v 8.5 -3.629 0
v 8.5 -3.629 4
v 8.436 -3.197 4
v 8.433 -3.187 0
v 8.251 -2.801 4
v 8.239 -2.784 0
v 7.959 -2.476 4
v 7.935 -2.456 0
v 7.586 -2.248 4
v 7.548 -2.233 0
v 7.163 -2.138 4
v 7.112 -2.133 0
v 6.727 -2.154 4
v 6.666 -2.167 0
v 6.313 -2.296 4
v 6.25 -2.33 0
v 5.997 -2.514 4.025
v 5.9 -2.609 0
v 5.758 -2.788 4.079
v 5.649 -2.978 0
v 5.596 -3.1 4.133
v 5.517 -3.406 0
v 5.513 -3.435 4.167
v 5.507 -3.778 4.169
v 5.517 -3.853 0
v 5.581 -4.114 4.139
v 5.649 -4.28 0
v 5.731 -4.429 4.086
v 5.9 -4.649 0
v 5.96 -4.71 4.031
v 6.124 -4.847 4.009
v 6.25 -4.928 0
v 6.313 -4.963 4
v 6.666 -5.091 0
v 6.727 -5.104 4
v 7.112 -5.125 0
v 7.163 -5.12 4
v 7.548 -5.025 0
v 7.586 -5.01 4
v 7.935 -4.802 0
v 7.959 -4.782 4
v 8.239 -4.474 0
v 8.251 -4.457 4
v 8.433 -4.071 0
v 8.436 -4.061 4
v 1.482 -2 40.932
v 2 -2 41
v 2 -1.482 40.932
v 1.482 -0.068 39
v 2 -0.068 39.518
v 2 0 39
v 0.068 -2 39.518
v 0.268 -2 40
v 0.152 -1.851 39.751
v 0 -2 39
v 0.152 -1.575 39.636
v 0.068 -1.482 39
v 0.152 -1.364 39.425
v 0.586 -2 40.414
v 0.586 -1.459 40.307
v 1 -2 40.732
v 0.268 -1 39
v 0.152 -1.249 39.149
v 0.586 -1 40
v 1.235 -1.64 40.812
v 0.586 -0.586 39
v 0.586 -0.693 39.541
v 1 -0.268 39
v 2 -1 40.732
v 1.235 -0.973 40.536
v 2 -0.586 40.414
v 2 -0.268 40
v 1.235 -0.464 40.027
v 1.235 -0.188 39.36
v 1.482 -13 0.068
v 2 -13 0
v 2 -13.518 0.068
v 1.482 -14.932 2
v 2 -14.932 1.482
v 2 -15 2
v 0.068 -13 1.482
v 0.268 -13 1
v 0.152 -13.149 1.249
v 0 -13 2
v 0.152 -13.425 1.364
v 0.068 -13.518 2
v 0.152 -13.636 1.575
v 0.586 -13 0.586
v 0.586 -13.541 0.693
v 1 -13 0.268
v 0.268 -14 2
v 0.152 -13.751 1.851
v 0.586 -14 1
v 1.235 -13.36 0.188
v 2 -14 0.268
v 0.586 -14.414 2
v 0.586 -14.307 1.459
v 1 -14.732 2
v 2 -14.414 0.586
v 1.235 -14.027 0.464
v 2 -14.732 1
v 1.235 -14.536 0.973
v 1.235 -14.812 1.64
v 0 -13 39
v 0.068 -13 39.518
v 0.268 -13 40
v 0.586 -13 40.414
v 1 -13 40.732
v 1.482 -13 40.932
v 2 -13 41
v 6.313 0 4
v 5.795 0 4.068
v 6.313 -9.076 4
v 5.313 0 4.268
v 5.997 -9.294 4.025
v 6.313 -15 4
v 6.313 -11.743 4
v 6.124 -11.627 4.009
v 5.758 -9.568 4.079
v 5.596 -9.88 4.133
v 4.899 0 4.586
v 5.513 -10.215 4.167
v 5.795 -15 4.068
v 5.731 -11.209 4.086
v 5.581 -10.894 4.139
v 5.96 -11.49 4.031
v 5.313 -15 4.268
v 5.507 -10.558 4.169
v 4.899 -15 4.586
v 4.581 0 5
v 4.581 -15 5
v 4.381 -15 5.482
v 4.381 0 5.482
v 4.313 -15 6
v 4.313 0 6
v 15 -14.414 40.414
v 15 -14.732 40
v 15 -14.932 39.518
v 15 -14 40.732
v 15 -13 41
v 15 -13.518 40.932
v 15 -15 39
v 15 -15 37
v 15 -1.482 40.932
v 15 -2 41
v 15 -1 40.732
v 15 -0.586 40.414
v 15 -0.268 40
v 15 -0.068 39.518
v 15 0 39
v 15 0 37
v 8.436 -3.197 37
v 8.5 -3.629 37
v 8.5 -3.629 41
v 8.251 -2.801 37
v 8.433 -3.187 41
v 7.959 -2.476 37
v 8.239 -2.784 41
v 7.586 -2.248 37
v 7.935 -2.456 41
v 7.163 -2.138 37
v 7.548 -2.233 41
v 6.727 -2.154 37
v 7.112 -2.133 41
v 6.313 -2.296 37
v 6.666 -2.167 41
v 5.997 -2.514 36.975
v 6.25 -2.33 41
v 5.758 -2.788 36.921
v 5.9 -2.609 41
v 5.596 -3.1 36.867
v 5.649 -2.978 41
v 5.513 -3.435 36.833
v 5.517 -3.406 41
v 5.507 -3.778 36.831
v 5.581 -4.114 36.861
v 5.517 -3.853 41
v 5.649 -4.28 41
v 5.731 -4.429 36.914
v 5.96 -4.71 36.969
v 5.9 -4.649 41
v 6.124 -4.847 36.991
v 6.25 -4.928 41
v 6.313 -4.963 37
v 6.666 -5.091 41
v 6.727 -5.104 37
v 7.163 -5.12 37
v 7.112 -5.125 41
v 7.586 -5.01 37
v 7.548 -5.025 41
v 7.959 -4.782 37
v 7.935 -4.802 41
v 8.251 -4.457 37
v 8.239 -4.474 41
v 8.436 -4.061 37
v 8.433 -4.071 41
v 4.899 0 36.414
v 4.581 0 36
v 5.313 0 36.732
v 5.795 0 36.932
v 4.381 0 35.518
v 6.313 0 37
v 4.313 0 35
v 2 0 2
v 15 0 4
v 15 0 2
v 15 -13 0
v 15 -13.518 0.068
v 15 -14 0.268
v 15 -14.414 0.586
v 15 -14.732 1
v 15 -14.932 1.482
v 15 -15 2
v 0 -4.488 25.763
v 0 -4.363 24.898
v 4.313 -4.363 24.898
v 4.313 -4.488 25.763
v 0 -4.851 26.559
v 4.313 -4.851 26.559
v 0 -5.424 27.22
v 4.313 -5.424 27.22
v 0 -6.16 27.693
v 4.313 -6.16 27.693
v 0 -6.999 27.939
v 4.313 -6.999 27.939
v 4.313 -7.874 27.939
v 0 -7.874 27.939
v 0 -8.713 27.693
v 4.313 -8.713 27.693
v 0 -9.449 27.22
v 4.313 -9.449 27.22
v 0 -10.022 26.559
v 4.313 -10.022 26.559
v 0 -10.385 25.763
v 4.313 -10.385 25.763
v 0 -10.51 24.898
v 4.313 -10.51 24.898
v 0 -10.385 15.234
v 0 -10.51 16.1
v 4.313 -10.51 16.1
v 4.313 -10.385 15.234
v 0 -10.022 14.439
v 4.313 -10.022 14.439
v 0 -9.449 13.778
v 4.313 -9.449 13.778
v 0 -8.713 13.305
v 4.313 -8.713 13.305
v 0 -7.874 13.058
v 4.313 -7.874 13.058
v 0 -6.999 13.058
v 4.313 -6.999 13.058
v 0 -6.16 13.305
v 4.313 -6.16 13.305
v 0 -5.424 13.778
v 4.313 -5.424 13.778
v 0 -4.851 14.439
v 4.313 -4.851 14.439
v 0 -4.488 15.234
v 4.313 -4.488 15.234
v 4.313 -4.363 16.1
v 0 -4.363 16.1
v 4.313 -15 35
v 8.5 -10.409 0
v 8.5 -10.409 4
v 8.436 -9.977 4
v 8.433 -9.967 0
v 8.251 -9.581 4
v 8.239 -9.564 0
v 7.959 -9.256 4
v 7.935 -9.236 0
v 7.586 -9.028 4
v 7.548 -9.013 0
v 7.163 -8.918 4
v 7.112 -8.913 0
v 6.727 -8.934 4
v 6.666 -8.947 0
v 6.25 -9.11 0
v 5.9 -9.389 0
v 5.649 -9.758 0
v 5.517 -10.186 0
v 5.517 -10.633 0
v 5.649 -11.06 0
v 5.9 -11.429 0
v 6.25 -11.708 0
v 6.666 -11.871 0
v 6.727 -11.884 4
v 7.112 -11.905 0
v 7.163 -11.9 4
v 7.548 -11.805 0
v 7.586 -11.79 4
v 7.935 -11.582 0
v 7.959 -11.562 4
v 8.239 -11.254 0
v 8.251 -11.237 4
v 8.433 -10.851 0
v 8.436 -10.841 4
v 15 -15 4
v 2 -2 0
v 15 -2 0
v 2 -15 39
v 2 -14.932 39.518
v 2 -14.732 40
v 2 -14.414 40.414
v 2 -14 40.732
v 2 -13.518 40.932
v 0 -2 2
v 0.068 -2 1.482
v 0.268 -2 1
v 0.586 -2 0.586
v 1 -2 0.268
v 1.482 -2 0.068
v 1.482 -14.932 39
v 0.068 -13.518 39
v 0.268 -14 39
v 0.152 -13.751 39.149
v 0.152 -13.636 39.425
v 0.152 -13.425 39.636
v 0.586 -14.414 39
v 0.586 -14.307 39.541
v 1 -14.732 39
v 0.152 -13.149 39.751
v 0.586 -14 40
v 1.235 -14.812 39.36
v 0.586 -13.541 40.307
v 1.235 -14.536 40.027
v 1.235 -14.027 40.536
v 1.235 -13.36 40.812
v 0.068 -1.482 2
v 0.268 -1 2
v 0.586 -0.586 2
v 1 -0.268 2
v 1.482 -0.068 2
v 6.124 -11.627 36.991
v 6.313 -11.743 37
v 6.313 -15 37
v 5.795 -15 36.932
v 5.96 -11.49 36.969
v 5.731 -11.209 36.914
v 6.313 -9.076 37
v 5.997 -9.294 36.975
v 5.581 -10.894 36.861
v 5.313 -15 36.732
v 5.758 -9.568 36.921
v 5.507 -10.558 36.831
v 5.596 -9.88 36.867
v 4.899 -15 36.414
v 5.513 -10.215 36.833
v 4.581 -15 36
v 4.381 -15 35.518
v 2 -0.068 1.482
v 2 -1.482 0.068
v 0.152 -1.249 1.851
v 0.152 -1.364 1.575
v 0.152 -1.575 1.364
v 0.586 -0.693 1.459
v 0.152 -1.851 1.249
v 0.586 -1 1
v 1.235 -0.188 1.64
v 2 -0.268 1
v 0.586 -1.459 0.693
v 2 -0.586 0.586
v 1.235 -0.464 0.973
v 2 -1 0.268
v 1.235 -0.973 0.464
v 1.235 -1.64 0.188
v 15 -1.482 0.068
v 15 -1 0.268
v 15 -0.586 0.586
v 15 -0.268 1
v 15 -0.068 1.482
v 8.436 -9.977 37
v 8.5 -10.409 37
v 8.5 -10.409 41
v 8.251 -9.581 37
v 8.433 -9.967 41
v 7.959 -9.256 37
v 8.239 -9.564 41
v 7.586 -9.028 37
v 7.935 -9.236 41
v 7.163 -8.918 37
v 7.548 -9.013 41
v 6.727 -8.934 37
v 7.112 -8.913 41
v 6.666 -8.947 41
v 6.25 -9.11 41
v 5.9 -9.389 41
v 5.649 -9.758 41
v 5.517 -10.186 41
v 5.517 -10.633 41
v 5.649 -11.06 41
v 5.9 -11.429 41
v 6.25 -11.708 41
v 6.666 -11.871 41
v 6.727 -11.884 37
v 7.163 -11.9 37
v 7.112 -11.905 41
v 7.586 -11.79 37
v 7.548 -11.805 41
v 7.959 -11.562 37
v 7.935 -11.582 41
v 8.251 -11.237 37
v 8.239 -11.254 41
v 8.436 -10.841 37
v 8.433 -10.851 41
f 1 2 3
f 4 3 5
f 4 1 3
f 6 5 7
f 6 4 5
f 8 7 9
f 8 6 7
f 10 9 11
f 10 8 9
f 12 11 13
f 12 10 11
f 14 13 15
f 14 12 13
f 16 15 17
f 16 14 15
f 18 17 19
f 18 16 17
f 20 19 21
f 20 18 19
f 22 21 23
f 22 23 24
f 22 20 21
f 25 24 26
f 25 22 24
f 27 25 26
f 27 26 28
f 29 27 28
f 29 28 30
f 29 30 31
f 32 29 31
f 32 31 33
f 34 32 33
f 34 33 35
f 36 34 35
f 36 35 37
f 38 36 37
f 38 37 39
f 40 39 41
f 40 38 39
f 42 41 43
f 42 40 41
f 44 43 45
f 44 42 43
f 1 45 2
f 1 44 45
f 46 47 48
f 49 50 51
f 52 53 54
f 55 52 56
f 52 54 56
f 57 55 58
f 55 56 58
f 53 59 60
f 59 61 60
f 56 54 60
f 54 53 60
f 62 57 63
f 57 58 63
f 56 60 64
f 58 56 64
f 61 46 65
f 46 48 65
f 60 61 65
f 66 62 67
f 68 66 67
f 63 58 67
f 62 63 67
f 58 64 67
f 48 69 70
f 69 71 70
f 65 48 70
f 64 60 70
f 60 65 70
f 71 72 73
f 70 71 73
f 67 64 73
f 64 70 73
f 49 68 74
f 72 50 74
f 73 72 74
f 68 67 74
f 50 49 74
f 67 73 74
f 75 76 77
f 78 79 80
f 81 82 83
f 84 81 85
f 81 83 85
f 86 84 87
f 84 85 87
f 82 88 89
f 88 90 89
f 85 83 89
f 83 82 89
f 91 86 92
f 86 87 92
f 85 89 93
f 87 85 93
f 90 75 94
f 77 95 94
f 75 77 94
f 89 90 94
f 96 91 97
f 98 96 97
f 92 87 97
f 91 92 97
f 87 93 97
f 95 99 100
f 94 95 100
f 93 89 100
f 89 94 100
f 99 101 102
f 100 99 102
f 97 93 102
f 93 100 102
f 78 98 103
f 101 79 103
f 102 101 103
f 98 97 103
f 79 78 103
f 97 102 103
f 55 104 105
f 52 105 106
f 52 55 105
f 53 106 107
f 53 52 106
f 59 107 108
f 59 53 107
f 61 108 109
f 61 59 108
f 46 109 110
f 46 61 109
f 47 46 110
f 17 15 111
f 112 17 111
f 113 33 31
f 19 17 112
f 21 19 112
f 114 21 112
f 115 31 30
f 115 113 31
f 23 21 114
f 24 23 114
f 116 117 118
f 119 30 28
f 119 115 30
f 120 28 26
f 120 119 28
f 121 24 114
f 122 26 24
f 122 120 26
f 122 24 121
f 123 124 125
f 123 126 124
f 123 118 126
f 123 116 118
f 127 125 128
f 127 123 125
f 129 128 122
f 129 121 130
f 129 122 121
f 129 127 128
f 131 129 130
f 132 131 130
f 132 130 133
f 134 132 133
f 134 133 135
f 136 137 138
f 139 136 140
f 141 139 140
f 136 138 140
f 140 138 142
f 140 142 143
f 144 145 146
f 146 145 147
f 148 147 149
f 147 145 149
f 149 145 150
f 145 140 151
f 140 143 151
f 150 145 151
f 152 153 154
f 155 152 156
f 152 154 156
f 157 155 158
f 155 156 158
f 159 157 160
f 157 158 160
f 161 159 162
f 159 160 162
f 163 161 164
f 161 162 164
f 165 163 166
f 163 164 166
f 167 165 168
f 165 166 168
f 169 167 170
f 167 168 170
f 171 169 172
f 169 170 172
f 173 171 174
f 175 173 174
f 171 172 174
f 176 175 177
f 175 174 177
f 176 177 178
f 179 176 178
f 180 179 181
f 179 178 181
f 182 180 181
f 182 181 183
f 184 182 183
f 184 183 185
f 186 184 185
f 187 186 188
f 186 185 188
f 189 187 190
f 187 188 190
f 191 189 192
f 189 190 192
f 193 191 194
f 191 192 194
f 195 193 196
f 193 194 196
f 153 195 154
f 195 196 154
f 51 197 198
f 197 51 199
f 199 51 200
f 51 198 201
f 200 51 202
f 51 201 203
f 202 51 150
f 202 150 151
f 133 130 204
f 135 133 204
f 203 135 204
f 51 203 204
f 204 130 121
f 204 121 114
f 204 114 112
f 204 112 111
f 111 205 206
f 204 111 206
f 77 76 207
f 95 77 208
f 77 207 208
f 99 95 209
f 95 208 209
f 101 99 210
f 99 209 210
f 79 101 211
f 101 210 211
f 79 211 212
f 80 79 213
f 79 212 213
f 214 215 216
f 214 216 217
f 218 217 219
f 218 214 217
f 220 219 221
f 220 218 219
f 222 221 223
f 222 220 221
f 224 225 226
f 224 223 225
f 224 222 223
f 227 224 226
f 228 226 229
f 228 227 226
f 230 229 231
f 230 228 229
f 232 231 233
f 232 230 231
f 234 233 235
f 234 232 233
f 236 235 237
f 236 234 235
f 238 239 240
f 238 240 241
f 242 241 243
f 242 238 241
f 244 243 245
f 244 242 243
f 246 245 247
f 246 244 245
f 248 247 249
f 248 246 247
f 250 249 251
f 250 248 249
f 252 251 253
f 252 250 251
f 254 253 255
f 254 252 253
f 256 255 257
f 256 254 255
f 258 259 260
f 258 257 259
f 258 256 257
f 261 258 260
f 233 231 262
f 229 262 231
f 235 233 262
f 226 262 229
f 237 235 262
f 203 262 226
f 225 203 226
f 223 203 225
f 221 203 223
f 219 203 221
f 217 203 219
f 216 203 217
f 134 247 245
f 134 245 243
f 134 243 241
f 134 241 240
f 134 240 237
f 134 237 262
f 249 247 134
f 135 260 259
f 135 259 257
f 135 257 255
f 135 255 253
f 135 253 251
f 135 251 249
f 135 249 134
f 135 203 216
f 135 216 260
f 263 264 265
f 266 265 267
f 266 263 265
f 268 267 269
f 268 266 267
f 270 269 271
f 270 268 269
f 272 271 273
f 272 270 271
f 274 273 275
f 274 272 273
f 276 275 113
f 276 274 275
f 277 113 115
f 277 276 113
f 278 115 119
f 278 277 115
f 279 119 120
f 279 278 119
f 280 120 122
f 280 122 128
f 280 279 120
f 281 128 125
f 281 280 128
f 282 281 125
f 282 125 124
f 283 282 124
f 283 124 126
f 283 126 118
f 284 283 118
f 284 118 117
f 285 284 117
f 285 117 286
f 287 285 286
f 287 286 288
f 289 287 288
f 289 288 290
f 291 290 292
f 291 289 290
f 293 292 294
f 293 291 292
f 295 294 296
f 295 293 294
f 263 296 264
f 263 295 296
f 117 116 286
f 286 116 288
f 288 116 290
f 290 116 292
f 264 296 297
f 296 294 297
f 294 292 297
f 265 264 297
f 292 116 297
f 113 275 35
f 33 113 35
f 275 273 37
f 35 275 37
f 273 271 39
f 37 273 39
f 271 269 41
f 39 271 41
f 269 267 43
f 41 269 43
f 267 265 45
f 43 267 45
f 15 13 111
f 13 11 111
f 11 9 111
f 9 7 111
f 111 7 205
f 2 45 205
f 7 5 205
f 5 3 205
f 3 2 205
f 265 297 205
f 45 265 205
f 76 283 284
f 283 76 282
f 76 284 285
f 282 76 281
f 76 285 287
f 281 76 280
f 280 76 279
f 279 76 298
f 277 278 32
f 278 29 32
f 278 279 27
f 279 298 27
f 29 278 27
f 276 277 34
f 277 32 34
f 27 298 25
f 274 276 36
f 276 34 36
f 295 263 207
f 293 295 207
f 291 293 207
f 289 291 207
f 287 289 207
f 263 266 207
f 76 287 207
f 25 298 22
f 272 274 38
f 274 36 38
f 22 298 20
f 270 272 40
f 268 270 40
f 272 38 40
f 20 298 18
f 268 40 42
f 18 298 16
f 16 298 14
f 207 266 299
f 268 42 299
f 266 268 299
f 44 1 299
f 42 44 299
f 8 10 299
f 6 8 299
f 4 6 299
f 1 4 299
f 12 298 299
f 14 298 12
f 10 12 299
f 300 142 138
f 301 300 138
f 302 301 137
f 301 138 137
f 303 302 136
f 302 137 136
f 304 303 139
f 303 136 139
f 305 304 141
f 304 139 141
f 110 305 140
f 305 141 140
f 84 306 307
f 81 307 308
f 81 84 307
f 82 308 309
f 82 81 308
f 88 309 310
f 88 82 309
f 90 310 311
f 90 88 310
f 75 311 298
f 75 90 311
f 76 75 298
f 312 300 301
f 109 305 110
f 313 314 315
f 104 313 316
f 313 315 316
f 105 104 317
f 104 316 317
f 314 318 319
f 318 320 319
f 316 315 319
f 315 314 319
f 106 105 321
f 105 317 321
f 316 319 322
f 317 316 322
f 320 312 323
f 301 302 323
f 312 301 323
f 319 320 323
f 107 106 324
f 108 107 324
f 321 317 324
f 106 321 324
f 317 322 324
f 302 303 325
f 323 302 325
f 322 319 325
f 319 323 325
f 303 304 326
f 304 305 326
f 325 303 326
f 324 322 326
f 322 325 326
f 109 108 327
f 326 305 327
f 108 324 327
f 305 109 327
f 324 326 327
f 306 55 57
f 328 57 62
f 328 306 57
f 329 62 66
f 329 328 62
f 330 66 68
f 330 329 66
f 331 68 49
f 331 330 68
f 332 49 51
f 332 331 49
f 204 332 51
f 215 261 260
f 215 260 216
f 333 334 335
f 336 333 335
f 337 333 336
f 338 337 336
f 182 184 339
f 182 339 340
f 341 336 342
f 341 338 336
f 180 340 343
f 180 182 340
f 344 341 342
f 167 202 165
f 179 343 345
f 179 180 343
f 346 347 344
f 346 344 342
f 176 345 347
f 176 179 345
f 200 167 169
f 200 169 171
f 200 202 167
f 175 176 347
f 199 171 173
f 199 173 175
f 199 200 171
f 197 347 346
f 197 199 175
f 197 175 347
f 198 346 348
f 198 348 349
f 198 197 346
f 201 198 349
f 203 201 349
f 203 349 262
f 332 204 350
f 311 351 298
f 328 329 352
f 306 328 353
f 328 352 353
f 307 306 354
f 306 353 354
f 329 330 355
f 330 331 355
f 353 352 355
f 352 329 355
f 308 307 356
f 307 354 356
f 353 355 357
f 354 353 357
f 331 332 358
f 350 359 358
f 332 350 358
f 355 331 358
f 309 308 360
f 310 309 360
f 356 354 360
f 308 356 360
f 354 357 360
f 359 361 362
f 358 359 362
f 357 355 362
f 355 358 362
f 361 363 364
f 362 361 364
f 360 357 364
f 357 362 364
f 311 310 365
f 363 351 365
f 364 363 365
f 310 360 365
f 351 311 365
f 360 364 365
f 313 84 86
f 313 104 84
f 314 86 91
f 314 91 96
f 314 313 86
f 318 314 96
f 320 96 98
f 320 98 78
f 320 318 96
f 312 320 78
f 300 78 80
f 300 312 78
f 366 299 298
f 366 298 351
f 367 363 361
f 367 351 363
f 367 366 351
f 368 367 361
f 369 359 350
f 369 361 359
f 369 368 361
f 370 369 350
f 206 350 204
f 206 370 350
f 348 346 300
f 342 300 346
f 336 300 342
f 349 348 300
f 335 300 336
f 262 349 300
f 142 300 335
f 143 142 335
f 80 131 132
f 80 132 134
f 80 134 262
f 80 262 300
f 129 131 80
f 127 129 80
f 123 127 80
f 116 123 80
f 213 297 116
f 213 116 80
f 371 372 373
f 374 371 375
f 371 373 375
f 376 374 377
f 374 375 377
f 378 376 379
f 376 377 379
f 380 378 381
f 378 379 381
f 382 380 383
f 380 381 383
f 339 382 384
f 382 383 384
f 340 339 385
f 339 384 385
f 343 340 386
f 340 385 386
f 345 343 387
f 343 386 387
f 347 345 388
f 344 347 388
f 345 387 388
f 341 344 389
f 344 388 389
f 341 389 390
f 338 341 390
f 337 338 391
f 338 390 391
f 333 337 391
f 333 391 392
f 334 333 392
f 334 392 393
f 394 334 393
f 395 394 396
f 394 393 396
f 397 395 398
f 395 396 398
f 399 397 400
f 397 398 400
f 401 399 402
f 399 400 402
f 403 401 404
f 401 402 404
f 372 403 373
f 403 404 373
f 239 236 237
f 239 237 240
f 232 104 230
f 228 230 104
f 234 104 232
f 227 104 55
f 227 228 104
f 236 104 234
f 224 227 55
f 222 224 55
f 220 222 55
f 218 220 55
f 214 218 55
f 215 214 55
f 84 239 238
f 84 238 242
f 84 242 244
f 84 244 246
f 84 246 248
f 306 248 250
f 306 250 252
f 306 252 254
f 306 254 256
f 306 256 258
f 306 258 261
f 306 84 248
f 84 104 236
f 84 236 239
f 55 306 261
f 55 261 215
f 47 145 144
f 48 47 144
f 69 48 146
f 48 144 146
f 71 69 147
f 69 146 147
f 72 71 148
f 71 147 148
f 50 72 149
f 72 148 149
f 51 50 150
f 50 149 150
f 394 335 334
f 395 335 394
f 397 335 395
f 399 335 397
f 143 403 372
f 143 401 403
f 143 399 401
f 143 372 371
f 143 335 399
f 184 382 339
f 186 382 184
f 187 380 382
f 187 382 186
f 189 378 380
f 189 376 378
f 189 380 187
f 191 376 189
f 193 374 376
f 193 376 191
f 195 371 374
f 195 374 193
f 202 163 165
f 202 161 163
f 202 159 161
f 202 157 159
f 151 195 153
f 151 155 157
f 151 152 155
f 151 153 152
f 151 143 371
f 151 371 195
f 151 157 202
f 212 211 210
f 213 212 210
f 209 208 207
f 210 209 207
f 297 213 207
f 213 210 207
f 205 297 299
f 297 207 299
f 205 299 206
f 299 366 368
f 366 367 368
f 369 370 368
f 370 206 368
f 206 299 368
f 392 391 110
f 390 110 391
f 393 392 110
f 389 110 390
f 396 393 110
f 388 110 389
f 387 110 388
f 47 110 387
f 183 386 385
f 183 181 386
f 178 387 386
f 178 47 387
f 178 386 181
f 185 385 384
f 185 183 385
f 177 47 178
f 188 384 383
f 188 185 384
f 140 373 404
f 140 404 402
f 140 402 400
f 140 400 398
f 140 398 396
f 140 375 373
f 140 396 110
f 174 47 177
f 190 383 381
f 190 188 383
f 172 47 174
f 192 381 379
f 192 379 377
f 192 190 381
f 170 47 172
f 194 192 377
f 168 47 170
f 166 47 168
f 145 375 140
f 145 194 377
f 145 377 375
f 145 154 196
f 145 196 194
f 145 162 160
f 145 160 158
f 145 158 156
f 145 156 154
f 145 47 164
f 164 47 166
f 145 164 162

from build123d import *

# Parameters (mm, degrees)
SKETCH_1_W               = 15
SKETCH_1_H               = 15
EXTRUDE_1_DEPTH          = 41
SKETCH_2_W               = 33
SKETCH_2_H               = 15
CUT_EXTRUDE_1_DEPTH      = 10.686952674
CUT_EXTRUDE_3_DEPTH      = 47.16275555
CUT_EXTRUDE_3_DEPTH_BACK = 47.16275555
SKETCH_3_R               = 1.5
CUT_EXTRUDE_4_DEPTH      = 47.16275555
FILLET_1_R               = 2
FILLET_2_R               = 2
FILLET_3_R               = 2
FILLET_4_R               = 2
FILLET_5_R               = 2
FILLET_6_R               = 2
FILLET_7_R               = 2


with BuildPart() as part:
    # 草图1 → 凸台-拉伸1 (new body)
    with BuildSketch(Plane.XY):
        with Locations((7.5, -7.5)):
            Rectangle(SKETCH_1_W, SKETCH_1_H)
    extrude(amount=EXTRUDE_1_DEPTH)

    # 草图2 → 切除-拉伸1 (cut)
    with BuildSketch(Plane(origin=(15, 0, 0), x_dir=(0, 0, -1), z_dir=(1, 0, 0))):
        with Locations((-20.5, -7.5)):
            Rectangle(SKETCH_2_W, SKETCH_2_H)
    extrude(amount=-CUT_EXTRUDE_1_DEPTH, mode=Mode.SUBTRACT)

    # 草图3 → 切除-拉伸3 (cut, two sides: drawn at the far end of the back side and taken through both)
    with BuildSketch(Plane.XY.offset(41).offset(-CUT_EXTRUDE_3_DEPTH_BACK)):
        with Locations((7, -3.629065036)):
            Circle(SKETCH_3_R)
        with Locations((7, -10.409065036)):
            Circle(SKETCH_3_R)
    extrude(amount=CUT_EXTRUDE_3_DEPTH + CUT_EXTRUDE_3_DEPTH_BACK, mode=Mode.SUBTRACT)

    # 草图4 → 切除-拉伸4 (cut, through all)
    with BuildSketch(Plane.ZY):
        with BuildLine():
            Line((16.1, -4.363439511), (24.89752721, -4.363439511))
            ThreePointArc((24.89752721, -4.363439511), (27.970585717, -7.436498018), (24.89752721, -10.509556524))
            Line((24.89752721, -10.509556524), (16.1, -10.509556524))
            ThreePointArc((16.1, -10.509556524), (13.026941494, -7.436498018), (16.1, -4.363439511))
        make_face()
    extrude(amount=-CUT_EXTRUDE_4_DEPTH, mode=Mode.SUBTRACT)

    # 圆角1
    fillet_1_edges = [part.edges().sort_by_distance(p)[0] for p in [
        (7.5, 0, 41),
    ]]
    fillet(fillet_1_edges, radius=FILLET_1_R)

    # 圆角2
    # the kernel refuses this fillet: 2 mm, written as the material it adds along each edge
    with BuildSketch(Plane(origin=(4.313047326, 0, 37), x_dir=(1, 0, 0), z_dir=(0, -1, 0))) as fillet_2_piece_1_section:
        with BuildLine():
            CenterArc((FILLET_2_R, -FILLET_2_R), FILLET_2_R, 90, 90)
            Line((0, -FILLET_2_R), (0, 0))
            Line((0, 0), (FILLET_2_R, 0))
        make_face()
    fillet_2_piece_1 = extrude(amount=15, mode=Mode.PRIVATE)
    fillet_2_piece_1 = fillet_2_piece_1 - Plane(origin=(7, -10.409065036, 36.539920903), x_dir=(1, 0, 0), z_dir=(0, 0, 1)) * Cylinder(1.5, 38, mode=Mode.PRIVATE)
    fillet_2_piece_1 = fillet_2_piece_1 - Plane(origin=(7, -3.629065036, 36.539920903), x_dir=(1, 0, 0), z_dir=(0, 0, 1)) * Cylinder(1.5, 38, mode=Mode.PRIVATE)
    add(fillet_2_piece_1)

    # 圆角3
    # the kernel refuses this fillet: 2 mm, written as the material it adds along each edge
    with BuildSketch(Plane(origin=(4.313047326, -15, 4), x_dir=(0, 0, 1), z_dir=(0, 1, 0))) as fillet_3_piece_1_section:
        with BuildLine():
            CenterArc((FILLET_3_R, FILLET_3_R), FILLET_3_R, 180, 90)
            Line((0, FILLET_3_R), (0, 0))
            Line((0, 0), (FILLET_3_R, 0))
        make_face()
    fillet_3_piece_1 = extrude(amount=15, mode=Mode.PRIVATE)
    fillet_3_piece_1 = fillet_3_piece_1 - Plane(origin=(7, -10.409065036, 4.460079004), x_dir=(1, 0, 0), z_dir=(0, 0, 1)) * Cylinder(1.5, 38, mode=Mode.PRIVATE)
    fillet_3_piece_1 = fillet_3_piece_1 - Plane(origin=(7, -3.629065036, 4.460079004), x_dir=(1, 0, 0), z_dir=(0, 0, 1)) * Cylinder(1.5, 38, mode=Mode.PRIVATE)
    add(fillet_3_piece_1)

    # 圆角4
    fillet_4_edges = [part.edges().sort_by_distance(p)[0] for p in [
        (7.5, -15, 41),
    ]]
    fillet(fillet_4_edges, radius=FILLET_4_R)

    # 圆角5
    fillet_5_edges = [part.edges().sort_by_distance(p)[0] for p in [
        (7.5, 0, 0),
    ]]
    fillet(fillet_5_edges, radius=FILLET_5_R)

    # 圆角6
    fillet_6_edges = [part.edges().sort_by_distance(p)[0] for p in [
        (7.5, -15, 0),
    ]]
    fillet(fillet_6_edges, radius=FILLET_6_R)

    # 圆角7
    fillet_7_edges = [part.edges().sort_by_distance(p)[0] for p in [
        (0, -15, 20.5),
        (0, -14.414213562, 40.414213562),
        (0, -7.5, 0),
        (0, -0.585786438, 0.585786438),
        (0, -14.414213562, 0.585786438),
        (0, 0, 20.5),
        (0, -7.5, 41),
        (0, -0.585786438, 40.414213562),
    ]]
    fillet(fillet_7_edges, radius=FILLET_7_R)


solid = part.part
